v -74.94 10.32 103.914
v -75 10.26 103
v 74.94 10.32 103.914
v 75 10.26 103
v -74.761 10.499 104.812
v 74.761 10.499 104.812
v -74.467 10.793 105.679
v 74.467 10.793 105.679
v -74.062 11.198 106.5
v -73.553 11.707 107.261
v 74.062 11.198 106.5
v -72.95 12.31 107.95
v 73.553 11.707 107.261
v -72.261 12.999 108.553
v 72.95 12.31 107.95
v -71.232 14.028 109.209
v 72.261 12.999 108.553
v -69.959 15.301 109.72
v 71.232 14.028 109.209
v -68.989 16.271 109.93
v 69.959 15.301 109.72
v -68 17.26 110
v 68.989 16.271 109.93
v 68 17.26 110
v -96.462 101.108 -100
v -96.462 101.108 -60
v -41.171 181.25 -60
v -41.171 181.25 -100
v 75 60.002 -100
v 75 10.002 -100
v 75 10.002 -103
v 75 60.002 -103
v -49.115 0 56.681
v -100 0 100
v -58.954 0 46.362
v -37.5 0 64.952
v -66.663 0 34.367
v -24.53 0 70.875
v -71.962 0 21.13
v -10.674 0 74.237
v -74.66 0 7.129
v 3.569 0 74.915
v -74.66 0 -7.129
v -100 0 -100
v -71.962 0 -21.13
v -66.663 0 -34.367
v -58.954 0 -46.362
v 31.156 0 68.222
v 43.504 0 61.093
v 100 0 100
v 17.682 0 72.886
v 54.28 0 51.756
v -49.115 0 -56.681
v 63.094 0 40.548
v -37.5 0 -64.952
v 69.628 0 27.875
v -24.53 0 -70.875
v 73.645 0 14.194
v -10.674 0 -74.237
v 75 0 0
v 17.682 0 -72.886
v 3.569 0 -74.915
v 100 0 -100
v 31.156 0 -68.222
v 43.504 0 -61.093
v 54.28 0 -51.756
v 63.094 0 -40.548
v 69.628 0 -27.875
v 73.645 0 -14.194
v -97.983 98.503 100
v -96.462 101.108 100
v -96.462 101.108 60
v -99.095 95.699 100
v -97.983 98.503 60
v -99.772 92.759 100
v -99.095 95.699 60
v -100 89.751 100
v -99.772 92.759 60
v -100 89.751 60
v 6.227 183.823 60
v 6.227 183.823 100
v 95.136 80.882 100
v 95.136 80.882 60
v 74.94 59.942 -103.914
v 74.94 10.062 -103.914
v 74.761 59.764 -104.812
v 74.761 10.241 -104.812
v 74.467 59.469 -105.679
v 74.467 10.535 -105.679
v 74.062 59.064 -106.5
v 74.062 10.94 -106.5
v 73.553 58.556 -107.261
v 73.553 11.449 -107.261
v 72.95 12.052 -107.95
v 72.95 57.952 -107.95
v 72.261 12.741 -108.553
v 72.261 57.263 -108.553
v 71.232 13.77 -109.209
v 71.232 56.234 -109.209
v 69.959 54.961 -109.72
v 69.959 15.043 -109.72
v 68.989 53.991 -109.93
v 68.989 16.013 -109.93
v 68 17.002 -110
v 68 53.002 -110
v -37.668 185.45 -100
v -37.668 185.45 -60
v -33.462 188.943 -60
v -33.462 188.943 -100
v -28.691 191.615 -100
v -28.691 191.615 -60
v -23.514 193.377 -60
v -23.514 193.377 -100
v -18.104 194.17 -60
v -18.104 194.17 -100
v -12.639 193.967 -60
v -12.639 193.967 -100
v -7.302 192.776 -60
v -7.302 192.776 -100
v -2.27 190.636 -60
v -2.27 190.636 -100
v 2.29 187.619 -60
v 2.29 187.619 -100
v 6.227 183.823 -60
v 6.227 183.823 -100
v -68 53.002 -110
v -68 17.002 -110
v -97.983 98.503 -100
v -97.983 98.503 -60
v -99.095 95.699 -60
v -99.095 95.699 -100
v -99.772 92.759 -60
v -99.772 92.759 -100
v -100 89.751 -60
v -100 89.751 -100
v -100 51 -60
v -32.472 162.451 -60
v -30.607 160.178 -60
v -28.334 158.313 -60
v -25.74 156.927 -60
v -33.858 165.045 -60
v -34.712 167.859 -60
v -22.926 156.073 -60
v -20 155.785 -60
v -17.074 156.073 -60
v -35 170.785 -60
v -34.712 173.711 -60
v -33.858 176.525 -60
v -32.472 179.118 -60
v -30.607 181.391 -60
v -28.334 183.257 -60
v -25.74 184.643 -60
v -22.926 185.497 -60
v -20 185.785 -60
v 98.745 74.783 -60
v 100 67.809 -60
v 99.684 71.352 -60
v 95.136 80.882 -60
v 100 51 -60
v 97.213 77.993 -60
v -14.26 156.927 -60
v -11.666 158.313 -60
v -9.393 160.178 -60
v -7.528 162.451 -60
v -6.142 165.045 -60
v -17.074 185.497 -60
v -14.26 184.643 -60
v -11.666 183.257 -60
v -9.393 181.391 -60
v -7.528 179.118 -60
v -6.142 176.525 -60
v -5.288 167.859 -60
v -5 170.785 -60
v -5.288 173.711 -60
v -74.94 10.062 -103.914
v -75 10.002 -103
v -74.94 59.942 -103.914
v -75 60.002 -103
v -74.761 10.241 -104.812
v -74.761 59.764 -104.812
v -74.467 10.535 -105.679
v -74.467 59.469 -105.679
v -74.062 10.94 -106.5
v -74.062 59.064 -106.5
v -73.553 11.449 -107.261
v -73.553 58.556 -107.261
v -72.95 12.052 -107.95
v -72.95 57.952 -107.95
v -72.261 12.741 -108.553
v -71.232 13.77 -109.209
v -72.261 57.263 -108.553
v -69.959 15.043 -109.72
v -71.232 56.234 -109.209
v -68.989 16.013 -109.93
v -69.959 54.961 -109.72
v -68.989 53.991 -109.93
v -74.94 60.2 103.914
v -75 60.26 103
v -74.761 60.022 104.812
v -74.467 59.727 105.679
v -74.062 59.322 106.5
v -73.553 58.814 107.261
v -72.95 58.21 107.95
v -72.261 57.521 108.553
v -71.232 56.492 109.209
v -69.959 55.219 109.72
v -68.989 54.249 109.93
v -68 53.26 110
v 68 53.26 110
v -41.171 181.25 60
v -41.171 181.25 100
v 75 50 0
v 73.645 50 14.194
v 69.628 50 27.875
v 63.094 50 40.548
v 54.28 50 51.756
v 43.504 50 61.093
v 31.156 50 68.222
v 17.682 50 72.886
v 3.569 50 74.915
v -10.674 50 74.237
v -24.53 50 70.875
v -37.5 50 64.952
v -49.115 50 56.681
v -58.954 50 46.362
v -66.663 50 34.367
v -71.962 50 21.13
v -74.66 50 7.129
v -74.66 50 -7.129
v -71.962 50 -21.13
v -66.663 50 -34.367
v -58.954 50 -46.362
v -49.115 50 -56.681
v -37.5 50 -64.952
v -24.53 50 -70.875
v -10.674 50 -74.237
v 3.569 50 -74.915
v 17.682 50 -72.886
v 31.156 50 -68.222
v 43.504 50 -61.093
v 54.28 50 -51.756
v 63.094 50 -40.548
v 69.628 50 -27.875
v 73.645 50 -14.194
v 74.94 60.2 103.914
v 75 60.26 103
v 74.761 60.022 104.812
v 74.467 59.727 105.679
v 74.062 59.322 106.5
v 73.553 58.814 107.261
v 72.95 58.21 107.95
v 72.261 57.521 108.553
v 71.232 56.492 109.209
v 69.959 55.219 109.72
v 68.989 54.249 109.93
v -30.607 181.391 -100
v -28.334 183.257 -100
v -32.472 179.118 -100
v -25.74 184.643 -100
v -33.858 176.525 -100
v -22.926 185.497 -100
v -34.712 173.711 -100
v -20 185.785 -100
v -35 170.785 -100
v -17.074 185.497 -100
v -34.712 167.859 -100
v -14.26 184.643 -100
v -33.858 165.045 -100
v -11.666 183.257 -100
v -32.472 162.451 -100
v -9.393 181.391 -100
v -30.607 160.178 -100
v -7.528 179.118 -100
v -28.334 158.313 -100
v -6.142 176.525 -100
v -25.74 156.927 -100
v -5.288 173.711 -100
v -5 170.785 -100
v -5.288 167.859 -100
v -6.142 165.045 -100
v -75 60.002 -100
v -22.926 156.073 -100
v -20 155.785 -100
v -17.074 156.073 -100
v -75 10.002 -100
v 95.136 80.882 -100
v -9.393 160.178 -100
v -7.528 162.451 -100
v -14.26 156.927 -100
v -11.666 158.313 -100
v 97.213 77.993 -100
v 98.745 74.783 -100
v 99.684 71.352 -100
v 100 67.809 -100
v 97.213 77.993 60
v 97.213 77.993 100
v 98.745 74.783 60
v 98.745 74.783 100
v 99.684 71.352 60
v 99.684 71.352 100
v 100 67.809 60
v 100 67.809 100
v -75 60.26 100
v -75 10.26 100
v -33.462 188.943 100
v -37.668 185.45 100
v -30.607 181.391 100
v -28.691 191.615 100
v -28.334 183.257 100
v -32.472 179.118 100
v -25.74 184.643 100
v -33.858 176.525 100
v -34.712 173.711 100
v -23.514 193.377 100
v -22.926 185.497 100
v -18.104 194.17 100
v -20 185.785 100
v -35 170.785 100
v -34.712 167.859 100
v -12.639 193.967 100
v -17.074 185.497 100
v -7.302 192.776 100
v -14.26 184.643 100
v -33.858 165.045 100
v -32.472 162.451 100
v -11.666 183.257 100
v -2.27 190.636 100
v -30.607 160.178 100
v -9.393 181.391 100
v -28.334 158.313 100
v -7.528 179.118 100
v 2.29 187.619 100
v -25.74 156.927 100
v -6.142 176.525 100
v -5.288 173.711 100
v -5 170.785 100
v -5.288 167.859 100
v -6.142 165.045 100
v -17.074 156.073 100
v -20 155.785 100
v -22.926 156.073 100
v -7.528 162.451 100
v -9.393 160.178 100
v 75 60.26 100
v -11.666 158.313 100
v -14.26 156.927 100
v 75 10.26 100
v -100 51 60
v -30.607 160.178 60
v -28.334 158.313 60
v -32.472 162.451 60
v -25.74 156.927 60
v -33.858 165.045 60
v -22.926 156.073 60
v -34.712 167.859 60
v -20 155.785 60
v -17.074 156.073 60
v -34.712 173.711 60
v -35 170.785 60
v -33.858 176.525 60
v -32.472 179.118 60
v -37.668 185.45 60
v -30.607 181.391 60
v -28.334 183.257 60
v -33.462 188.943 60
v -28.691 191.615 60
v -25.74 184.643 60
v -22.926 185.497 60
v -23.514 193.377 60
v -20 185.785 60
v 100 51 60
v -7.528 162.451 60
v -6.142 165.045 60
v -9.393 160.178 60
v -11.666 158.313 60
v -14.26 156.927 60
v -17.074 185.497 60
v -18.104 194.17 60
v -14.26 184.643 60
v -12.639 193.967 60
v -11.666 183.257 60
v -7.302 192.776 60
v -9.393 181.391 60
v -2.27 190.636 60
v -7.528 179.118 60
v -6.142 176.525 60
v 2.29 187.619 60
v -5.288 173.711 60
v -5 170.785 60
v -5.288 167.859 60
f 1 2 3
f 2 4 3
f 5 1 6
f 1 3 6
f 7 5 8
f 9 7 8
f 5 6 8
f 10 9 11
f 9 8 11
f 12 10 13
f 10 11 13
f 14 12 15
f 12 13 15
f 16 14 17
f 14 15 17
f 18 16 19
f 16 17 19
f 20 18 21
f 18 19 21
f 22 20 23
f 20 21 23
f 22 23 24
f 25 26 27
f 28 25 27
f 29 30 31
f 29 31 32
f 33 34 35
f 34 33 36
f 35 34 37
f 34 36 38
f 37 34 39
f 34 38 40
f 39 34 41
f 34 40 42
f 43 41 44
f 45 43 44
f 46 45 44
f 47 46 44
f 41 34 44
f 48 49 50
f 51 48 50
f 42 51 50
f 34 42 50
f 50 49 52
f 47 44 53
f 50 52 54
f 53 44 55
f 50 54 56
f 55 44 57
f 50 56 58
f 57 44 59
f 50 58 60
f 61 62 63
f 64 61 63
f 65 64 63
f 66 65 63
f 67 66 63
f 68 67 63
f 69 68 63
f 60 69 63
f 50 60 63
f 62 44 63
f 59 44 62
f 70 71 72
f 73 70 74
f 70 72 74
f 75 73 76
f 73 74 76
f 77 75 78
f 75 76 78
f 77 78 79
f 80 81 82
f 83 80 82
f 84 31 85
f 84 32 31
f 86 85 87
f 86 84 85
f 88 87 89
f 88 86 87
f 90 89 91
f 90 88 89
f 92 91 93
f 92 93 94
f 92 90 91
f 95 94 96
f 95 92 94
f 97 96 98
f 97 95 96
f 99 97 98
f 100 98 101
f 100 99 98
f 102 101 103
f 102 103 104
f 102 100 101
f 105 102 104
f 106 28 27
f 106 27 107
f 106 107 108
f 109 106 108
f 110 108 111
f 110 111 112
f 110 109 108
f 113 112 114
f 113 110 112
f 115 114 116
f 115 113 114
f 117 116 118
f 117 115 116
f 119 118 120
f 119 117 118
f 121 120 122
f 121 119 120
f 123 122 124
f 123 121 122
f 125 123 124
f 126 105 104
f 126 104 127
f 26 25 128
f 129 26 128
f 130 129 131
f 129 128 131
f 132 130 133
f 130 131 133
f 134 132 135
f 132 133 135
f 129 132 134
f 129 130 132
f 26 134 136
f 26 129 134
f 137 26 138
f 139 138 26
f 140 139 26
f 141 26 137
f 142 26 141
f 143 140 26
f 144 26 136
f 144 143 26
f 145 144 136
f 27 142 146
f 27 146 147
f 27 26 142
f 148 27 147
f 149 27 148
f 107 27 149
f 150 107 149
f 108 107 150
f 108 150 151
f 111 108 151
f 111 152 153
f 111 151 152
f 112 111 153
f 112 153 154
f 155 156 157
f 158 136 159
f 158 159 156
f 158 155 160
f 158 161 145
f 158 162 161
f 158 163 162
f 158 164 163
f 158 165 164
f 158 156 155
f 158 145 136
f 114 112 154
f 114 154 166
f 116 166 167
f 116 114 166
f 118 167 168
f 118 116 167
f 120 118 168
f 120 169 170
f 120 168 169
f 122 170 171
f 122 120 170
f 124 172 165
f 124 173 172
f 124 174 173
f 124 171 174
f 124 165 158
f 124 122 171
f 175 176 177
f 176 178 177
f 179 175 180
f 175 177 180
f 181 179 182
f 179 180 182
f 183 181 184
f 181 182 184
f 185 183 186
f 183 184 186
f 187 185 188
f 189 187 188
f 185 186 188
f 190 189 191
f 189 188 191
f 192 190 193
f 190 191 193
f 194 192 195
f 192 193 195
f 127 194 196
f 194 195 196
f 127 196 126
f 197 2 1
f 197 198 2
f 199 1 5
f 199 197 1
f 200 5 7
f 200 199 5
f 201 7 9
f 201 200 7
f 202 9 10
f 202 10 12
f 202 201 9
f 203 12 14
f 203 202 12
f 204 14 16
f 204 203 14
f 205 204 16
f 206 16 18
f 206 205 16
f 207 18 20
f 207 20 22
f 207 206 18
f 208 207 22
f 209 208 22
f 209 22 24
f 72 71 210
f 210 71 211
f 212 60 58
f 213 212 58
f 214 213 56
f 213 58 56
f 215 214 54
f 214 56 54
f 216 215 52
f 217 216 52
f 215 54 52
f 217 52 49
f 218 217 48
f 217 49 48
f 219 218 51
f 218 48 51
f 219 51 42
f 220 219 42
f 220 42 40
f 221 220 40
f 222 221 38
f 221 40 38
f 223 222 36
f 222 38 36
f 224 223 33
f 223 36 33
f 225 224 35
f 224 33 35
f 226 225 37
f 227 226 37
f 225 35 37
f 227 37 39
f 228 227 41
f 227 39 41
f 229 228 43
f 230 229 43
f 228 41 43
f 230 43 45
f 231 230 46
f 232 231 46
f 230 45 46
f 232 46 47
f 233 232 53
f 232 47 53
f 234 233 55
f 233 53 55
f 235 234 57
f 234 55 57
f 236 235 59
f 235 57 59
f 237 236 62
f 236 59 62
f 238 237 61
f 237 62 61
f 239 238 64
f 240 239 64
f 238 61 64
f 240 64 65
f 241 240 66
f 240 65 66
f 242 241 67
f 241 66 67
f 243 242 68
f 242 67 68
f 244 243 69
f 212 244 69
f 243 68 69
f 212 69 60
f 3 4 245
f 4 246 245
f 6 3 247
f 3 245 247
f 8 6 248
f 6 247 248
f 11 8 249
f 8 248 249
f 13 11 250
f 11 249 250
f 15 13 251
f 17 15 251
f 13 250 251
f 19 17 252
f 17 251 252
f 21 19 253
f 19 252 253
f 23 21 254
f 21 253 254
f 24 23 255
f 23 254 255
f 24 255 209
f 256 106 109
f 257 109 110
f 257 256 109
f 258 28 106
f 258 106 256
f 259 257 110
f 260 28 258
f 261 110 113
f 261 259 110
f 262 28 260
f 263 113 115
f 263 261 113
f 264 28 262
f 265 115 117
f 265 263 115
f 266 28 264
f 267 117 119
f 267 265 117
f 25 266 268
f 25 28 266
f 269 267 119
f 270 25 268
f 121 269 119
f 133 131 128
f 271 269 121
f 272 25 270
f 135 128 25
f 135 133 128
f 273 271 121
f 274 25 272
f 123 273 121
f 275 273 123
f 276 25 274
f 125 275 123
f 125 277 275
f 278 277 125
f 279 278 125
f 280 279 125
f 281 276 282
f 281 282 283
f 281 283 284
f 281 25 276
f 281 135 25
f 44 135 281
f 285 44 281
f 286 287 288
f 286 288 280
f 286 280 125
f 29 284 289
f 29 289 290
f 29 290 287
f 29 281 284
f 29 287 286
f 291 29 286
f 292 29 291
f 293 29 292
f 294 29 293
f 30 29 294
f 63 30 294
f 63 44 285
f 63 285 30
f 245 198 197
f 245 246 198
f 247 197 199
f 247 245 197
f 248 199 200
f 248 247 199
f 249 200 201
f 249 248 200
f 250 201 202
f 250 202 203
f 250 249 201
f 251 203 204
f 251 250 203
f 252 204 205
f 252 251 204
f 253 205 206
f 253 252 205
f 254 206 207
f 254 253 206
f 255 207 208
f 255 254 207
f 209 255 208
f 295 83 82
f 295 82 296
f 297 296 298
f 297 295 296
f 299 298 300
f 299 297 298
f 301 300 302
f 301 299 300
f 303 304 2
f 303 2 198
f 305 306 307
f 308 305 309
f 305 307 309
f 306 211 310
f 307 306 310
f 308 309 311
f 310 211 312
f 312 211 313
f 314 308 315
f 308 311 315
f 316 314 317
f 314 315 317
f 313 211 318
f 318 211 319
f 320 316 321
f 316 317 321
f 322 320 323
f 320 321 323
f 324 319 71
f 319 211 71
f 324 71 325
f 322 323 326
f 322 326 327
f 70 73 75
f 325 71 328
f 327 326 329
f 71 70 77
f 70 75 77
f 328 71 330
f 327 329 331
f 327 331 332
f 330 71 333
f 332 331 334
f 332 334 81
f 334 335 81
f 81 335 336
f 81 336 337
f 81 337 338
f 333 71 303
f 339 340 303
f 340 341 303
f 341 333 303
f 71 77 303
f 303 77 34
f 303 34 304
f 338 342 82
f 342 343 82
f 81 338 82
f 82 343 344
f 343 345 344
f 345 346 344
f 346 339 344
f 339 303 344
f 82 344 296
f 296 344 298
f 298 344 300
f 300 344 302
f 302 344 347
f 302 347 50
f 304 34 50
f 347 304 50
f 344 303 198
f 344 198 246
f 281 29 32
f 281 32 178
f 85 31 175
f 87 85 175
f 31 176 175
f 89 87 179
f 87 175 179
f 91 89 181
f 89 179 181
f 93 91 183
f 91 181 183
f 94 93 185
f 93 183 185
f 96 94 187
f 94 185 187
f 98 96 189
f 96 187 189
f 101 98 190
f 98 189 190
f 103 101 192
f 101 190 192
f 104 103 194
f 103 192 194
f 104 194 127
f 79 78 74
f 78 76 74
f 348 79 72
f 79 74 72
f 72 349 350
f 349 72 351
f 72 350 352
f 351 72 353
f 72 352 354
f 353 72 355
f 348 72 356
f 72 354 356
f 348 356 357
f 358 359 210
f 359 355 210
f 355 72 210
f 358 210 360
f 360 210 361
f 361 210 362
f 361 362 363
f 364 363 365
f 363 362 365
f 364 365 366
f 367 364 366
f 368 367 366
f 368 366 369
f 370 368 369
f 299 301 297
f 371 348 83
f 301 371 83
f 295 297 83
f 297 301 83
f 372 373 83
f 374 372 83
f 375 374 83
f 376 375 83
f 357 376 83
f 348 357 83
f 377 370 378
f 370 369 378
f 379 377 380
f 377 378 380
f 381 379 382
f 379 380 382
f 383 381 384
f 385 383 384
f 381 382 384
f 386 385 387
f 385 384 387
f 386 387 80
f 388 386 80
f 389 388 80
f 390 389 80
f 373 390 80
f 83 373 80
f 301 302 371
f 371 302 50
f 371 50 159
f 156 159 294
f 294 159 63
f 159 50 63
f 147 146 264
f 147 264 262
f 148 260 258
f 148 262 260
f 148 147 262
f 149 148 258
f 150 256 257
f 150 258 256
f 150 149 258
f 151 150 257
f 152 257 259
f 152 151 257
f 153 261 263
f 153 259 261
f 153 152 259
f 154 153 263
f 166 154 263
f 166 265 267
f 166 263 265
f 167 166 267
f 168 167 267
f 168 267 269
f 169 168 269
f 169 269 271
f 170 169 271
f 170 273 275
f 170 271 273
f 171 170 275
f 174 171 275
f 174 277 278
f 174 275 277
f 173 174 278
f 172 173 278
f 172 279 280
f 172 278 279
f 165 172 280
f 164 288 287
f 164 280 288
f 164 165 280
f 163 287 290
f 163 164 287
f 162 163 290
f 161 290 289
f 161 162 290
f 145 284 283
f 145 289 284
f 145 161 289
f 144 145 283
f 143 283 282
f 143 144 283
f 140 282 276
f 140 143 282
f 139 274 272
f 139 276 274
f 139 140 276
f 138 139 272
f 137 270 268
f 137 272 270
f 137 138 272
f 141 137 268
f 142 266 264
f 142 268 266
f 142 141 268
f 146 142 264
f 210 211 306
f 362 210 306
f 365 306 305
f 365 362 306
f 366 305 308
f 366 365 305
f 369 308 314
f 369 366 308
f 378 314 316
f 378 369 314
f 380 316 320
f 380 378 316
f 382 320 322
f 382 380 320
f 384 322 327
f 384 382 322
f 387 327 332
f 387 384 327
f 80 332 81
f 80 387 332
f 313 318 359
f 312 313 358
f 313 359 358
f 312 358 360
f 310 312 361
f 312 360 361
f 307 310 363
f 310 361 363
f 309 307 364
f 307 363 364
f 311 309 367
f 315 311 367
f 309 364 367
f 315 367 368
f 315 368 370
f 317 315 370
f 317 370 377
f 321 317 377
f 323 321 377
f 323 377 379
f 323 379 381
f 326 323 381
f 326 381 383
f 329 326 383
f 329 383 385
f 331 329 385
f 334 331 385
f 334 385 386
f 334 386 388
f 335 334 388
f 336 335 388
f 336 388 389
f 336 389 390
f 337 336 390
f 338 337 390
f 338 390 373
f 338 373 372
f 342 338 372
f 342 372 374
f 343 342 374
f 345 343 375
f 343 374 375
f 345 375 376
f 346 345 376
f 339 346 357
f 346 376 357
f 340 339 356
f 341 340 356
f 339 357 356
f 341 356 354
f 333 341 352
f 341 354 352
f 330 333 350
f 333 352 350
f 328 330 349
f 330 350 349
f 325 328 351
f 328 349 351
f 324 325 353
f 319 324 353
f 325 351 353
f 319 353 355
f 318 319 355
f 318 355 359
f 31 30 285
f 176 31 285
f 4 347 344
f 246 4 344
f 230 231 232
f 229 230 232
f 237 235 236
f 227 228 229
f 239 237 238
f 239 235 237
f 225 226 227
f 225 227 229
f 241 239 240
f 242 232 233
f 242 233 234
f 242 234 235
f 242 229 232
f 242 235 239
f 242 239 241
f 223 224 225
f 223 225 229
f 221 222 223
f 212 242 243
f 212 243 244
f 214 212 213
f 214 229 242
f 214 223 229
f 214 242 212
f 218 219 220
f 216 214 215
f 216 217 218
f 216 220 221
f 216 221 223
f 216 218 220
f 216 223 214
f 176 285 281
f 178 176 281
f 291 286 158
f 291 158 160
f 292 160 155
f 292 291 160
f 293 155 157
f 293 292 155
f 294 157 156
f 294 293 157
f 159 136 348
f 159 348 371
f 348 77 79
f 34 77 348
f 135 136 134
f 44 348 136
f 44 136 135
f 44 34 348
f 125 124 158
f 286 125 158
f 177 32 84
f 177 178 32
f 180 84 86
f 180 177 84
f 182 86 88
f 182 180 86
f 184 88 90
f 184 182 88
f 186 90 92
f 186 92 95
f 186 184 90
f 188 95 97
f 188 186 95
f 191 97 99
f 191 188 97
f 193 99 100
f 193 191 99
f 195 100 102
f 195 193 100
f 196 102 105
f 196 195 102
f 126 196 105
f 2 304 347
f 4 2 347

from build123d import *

# Parameters (mm, degrees)
SKETCH1_W               = 200
SKETCH1_H               = 200
BOSS_EXTRUDE1_DEPTH     = 300
SKETCH2_R               = 75
CUT_EXTRUDE1_DEPTH      = 50
CUT_EXTRUDE2_DEPTH      = 201
FILLET1_R               = 30
FILLET2_R               = 20
SKETCH4_W               = 200
SKETCH4_H               = 120
CUT_EXTRUDE3_DEPTH      = 149
SKETCH7_R               = 15
CUT_EXTRUDE4_DEPTH      = 200
CUT_EXTRUDE4_DEPTH_BACK = 149
SKETCH8_W               = 150
SKETCH8_H               = 50
BOSS_EXTRUDE2_DEPTH     = 10
FILLET3_R               = 7
SKETCH9_W               = 150
SKETCH9_H               = 50
BOSS_EXTRUDE3_DEPTH     = 10
FILLET4_R               = 7


with BuildPart() as part:
    # Sketch1 → Boss-Extrude1 (new body)
    with BuildSketch(Plane(origin=(0, 0, 0), x_dir=(1, 0, 0), z_dir=(0, 1, 0))):
        Rectangle(SKETCH1_W, SKETCH1_H)
    extrude(amount=BOSS_EXTRUDE1_DEPTH)

    # Sketch2 → Cut-Extrude1 (cut)
    with BuildSketch(Plane.XZ):
        Circle(SKETCH2_R)
    extrude(amount=-CUT_EXTRUDE1_DEPTH, mode=Mode.SUBTRACT)

    # Sketch3 → Cut-Extrude2 (cut, through all)
    with BuildSketch(Plane.XY.offset(100)):
        Polygon((-100, 95.980685294), (-19.135993401, 213.188644877), (100, 75.250025776), (100, 300), (-100, 300), align=None)
    extrude(amount=-CUT_EXTRUDE2_DEPTH, mode=Mode.SUBTRACT)

    # Fillet1
    fillet1_edges = [part.edges().sort_by_distance(p)[0] for p in [
        (-19.135993401, 213.188644877, 0),
    ]]
    fillet(fillet1_edges, radius=FILLET1_R)

    # Fillet2
    fillet2_edges = [part.edges().sort_by_distance(p)[0] for p in [
        (-100, 95.980685294, 0),
        (100, 75.250025776, 0),
    ]]
    fillet(fillet2_edges, radius=FILLET2_R)

    # Sketch4 → Cut-Extrude3 (cut)
    with BuildSketch(Plane(origin=(0, 200, 0), x_dir=(1, 0, 0), z_dir=(0, 1, 0))):
        Rectangle(SKETCH4_W, SKETCH4_H)
    extrude(amount=-CUT_EXTRUDE3_DEPTH, mode=Mode.SUBTRACT)

    # Sketch7 → Cut-Extrude4 (cut, two sides)
    with BuildSketch(Plane(origin=(0, 0, 60), x_dir=(-1, 0, 0), z_dir=(0, 0, -1))) as cut_extrude4_sk:
        with Locations((20, 170.784862367)):
            Circle(SKETCH7_R)
    extrude(amount=CUT_EXTRUDE4_DEPTH, mode=Mode.SUBTRACT)
    extrude(cut_extrude4_sk.sketch, amount=-CUT_EXTRUDE4_DEPTH_BACK, mode=Mode.SUBTRACT)

    # Sketch8 → Boss-Extrude2 (add)
    with BuildSketch(Plane.XY.offset(100)):
        with Locations((0, 35.260136057)):
            Rectangle(SKETCH8_W, SKETCH8_H)
    extrude(amount=BOSS_EXTRUDE2_DEPTH)

    # Fillet3
    fillet3_edges = [part.edges().sort_by_distance(p)[0] for p in [
        (-75, 35.260136057, 110),
        (0, 10.260136057, 110),
        (75, 35.260136057, 110),
        (0, 60.260136057, 110),
    ]]
    fillet(fillet3_edges, radius=FILLET3_R)

    # Sketch9 → Boss-Extrude3 (add)
    with BuildSketch(Plane(origin=(0, 0, -100), x_dir=(-1, 0, 0), z_dir=(0, 0, -1))):
        with Locations((0, 35.002047413)):
            Rectangle(SKETCH9_W, SKETCH9_H)
    extrude(amount=BOSS_EXTRUDE3_DEPTH)

    # Fillet4
    fillet4_edges = [part.edges().sort_by_distance(p)[0] for p in [
        (75, 35.002047413, -110),
        (0, 10.002047413, -110),
        (-75, 35.002047413, -110),
        (0, 60.002047413, -110),
    ]]
    fillet(fillet4_edges, radius=FILLET4_R)


solid = part.part
